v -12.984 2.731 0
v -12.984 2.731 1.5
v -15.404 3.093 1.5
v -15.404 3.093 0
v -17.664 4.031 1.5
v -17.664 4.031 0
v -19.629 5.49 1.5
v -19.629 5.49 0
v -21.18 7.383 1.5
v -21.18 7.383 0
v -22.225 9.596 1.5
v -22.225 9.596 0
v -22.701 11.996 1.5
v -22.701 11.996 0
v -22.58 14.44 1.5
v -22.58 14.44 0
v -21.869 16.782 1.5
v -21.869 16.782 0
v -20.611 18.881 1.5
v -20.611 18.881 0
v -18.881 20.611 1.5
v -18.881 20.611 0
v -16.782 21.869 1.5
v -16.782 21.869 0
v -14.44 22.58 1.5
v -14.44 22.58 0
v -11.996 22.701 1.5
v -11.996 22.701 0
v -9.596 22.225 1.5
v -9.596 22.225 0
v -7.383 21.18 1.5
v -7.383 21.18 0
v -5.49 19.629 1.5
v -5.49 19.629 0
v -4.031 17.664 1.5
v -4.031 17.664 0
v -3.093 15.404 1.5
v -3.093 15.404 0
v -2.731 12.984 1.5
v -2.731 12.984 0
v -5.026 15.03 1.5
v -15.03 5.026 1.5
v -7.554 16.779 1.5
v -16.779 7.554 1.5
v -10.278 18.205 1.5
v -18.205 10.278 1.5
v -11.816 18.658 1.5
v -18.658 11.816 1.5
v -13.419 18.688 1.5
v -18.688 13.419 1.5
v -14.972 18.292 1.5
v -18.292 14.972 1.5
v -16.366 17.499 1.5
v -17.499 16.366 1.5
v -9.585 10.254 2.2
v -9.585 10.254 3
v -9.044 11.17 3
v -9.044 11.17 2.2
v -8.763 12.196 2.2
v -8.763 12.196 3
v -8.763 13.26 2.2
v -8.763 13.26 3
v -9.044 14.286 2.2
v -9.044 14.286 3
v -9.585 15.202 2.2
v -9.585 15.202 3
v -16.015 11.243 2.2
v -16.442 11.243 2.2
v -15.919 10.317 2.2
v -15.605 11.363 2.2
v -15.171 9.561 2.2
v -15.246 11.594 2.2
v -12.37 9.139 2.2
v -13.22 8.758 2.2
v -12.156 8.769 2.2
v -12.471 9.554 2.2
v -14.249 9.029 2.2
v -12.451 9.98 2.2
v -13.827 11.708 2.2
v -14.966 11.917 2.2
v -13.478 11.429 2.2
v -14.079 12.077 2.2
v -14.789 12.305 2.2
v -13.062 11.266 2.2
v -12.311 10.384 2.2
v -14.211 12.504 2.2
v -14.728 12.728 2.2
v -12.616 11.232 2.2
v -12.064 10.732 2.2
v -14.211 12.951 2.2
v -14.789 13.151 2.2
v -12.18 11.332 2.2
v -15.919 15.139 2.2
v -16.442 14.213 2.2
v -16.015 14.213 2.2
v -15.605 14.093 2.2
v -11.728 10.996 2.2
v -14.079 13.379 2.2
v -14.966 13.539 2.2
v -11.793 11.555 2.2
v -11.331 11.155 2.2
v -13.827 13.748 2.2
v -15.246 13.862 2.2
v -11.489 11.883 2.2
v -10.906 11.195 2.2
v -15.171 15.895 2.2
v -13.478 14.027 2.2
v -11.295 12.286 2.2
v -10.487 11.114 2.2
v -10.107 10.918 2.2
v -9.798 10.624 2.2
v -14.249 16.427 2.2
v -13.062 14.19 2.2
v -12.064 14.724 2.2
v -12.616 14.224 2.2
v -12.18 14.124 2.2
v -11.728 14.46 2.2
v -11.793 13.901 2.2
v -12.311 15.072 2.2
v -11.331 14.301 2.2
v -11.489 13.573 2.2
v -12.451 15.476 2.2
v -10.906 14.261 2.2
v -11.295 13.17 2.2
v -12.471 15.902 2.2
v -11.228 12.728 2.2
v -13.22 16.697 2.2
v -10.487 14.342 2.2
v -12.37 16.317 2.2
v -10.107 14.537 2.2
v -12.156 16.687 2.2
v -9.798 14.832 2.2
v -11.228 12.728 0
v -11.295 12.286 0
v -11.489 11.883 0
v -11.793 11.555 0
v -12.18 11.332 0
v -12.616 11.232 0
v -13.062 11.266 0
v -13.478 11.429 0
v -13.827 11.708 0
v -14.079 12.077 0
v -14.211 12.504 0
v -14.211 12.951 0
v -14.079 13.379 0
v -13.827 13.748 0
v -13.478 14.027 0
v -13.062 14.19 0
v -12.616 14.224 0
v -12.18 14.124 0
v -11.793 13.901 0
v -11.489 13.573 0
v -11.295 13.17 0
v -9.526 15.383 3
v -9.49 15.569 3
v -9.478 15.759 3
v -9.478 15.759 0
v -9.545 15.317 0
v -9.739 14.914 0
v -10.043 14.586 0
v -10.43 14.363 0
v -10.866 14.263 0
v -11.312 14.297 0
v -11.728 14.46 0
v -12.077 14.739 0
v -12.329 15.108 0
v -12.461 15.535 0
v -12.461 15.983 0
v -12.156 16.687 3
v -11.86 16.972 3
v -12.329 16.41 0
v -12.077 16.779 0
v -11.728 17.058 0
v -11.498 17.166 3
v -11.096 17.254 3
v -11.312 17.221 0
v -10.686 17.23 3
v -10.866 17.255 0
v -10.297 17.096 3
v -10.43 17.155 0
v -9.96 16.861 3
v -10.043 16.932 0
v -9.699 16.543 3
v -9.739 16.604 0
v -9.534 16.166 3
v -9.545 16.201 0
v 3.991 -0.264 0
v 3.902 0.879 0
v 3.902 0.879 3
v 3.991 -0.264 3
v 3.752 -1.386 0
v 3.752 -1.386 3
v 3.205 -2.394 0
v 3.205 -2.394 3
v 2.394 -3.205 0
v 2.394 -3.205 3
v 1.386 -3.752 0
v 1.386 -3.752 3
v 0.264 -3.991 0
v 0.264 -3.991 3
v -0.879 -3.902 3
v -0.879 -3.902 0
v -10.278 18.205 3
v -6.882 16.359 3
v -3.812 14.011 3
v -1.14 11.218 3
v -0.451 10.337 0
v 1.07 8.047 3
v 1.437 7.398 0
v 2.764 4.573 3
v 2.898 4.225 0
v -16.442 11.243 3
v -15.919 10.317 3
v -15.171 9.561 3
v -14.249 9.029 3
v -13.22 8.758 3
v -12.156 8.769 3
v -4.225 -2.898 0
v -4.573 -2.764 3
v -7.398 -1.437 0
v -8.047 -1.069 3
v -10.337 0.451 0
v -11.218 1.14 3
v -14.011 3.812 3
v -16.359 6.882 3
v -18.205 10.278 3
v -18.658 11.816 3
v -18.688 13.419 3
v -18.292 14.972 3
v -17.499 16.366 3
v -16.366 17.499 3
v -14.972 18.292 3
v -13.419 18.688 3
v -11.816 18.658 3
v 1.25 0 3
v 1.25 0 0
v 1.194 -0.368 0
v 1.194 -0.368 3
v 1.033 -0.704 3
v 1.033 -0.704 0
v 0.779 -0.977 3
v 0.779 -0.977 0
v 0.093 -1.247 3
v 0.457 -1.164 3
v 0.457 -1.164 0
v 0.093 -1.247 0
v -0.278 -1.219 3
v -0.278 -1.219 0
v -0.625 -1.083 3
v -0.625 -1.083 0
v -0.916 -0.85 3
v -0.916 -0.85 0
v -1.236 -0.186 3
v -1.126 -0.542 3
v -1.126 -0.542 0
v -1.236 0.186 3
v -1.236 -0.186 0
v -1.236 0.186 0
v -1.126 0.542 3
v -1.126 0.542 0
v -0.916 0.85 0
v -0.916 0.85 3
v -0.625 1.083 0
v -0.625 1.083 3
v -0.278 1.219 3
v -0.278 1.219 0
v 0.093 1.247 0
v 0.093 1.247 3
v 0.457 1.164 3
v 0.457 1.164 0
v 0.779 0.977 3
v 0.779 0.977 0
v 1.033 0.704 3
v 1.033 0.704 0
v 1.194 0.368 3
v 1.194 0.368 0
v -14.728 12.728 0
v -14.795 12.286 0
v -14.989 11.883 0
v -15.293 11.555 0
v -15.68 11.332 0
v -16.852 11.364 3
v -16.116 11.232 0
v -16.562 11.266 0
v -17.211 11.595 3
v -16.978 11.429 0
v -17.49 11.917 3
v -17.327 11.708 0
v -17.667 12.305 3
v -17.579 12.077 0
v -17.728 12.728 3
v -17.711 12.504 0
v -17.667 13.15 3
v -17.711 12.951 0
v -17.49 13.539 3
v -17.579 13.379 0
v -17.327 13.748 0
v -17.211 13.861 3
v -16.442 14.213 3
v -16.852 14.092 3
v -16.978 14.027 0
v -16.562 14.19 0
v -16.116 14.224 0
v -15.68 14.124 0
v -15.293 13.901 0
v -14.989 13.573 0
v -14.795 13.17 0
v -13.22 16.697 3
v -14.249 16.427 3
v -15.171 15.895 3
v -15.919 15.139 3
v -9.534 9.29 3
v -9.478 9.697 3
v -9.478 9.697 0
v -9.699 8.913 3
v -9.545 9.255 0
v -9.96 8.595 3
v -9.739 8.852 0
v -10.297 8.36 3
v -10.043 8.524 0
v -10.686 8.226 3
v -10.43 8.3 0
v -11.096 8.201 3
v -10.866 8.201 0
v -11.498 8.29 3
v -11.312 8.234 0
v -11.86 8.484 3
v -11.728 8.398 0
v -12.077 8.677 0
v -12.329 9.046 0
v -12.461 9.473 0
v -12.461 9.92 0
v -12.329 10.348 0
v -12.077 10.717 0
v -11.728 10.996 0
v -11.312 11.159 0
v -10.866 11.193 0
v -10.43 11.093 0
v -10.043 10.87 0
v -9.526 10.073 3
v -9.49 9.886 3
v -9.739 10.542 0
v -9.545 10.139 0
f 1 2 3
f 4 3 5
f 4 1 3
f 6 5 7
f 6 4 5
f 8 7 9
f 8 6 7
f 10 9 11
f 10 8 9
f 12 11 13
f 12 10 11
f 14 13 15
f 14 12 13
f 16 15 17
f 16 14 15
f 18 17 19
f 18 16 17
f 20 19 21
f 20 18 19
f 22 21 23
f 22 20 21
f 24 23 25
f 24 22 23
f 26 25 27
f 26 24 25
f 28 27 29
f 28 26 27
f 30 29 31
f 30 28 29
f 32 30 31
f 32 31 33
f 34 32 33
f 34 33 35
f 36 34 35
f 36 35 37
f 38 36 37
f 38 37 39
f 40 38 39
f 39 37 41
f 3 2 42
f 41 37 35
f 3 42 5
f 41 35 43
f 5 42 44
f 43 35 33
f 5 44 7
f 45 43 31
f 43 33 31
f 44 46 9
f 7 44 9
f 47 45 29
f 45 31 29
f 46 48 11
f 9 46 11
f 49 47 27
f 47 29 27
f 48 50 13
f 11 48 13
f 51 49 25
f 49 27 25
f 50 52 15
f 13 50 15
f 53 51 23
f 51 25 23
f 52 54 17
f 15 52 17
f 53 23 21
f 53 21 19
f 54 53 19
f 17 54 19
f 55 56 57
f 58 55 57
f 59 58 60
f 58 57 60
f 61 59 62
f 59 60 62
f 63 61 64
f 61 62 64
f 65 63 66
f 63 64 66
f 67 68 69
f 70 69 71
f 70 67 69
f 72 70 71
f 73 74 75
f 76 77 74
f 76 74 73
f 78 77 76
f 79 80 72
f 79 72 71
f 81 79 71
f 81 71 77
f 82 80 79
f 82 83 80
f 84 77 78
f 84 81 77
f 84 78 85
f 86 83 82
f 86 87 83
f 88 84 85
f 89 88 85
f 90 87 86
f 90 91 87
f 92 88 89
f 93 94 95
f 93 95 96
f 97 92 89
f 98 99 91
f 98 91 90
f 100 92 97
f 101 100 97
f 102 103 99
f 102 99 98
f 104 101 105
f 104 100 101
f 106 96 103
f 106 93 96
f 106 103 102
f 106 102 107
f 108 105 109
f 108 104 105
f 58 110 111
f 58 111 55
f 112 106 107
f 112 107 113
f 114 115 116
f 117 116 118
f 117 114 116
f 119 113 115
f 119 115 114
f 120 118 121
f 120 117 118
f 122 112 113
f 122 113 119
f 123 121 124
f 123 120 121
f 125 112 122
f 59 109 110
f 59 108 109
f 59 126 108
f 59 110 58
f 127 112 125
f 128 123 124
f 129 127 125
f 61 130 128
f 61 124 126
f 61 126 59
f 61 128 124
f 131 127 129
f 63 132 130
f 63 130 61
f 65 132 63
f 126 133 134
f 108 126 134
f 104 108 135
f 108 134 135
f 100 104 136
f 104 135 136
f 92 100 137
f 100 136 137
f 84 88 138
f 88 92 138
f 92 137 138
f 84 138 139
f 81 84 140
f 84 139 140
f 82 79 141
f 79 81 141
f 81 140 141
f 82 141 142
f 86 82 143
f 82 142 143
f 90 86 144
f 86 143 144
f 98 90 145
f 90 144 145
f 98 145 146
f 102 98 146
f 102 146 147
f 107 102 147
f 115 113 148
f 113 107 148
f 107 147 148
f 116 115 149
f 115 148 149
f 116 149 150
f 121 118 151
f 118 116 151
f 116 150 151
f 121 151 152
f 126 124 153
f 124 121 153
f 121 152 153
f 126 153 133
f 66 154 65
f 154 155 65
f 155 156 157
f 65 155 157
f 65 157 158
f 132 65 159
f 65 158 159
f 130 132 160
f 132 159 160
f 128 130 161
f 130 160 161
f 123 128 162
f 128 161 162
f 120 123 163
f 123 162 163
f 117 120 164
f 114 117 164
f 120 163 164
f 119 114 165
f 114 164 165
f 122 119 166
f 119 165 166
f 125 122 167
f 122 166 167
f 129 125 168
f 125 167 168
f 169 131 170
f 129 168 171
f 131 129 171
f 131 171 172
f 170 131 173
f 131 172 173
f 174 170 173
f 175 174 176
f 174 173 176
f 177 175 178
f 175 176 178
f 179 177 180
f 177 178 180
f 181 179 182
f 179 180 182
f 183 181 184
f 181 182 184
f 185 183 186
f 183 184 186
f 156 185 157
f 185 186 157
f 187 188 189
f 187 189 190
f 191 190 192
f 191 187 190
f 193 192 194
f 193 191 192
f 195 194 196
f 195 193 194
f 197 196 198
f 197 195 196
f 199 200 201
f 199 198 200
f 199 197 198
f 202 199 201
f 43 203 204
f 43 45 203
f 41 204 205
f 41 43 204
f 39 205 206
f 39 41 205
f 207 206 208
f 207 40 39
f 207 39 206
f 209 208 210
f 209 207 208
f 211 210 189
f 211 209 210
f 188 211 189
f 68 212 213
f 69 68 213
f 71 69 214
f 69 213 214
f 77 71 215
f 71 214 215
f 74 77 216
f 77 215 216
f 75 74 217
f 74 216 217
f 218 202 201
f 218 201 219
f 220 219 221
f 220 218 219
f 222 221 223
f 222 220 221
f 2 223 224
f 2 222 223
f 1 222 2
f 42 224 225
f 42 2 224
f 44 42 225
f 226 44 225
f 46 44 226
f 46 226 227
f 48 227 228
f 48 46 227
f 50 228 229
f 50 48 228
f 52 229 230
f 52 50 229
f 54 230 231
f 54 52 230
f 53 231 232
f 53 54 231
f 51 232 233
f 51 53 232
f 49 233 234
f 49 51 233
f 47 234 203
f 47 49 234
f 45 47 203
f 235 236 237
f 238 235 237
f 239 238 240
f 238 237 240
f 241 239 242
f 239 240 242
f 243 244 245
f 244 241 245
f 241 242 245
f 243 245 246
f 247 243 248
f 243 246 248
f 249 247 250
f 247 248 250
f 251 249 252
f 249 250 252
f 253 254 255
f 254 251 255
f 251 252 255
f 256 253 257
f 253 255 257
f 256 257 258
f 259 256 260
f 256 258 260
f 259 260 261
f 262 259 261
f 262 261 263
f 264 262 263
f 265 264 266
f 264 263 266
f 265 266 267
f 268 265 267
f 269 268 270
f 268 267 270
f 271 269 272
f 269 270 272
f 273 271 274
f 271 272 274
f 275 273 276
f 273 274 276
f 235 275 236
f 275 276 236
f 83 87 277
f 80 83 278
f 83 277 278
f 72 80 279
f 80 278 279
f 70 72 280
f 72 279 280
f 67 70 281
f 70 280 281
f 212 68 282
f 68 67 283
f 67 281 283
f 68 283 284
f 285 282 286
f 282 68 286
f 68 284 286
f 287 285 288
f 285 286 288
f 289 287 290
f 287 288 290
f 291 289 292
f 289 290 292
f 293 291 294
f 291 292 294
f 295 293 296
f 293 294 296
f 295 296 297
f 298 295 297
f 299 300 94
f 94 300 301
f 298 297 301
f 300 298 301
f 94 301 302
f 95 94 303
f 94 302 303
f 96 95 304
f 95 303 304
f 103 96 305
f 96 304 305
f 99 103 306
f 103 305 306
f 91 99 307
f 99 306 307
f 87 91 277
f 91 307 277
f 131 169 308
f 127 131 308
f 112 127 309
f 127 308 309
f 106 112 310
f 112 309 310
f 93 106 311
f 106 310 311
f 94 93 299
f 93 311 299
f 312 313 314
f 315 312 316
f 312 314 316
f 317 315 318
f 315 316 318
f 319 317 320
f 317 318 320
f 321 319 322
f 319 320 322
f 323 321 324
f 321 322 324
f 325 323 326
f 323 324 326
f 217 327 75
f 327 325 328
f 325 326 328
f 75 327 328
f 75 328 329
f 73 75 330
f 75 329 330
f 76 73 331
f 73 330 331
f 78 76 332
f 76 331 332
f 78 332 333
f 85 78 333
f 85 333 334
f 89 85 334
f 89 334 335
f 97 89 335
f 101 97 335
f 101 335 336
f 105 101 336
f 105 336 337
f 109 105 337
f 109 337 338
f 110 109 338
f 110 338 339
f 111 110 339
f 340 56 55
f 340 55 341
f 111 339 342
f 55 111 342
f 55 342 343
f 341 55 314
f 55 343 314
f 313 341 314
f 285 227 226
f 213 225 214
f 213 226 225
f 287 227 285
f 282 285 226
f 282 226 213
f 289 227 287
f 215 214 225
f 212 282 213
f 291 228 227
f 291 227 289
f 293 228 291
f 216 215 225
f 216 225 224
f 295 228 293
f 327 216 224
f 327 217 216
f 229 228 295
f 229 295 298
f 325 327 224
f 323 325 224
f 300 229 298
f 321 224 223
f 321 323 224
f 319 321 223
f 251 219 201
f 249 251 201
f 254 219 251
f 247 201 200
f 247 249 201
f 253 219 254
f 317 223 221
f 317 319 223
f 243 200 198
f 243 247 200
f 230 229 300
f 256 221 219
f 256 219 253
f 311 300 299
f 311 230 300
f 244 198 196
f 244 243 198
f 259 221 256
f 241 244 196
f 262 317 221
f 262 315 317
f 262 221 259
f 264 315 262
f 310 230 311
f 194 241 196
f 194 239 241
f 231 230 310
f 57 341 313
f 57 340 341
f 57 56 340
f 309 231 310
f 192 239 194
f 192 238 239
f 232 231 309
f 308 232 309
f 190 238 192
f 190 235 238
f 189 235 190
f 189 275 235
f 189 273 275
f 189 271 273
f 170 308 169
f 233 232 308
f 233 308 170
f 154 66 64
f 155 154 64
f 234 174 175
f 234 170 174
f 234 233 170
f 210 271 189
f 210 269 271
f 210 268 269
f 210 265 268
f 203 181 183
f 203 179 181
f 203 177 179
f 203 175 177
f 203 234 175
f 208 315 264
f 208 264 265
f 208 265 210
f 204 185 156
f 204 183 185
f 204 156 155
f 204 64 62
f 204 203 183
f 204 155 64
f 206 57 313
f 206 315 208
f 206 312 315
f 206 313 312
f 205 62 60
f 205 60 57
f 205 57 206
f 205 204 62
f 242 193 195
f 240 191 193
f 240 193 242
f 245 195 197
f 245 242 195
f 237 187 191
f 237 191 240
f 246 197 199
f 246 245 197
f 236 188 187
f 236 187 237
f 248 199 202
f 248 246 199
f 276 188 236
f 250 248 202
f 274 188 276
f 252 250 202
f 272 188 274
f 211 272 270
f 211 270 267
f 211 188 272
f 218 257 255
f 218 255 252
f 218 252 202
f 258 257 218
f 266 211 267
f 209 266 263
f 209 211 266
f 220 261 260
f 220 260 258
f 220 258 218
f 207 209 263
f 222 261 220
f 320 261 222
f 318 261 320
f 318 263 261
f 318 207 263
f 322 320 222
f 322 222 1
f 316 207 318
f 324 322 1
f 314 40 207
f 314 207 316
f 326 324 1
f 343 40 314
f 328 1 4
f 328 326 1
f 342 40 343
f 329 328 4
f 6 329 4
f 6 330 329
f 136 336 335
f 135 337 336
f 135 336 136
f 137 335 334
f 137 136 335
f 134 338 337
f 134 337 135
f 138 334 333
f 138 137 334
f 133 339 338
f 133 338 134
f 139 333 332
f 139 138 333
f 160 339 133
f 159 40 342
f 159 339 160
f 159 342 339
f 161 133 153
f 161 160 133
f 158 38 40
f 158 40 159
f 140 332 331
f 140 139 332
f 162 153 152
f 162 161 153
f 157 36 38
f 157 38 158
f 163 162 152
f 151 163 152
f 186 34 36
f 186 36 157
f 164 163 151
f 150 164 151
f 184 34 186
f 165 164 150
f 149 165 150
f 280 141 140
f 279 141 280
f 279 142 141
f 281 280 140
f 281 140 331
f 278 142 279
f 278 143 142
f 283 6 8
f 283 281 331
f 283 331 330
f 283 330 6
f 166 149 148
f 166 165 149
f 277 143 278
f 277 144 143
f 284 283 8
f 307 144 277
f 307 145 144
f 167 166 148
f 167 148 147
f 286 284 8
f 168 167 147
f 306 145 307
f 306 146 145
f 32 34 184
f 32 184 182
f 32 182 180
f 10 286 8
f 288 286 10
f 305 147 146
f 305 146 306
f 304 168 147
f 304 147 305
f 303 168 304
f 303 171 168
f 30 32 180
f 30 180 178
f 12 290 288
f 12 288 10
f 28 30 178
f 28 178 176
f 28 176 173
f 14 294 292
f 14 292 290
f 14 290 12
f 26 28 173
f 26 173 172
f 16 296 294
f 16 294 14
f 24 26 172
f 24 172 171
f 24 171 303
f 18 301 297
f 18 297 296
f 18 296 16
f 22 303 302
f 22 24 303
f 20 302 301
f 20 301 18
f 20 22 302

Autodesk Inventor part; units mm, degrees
ref_plane "YZ Plane" through (0, 0, 0) normal (1, 0, 0) x (0, 1, 0)
ref_plane "XZ Plane" through (0, 0, 0) normal (0, 1, 0) x (-1, 0, 0)
ref_plane "XY Plane" through (0, 0, 0) normal (0, 0, 1) x (1, 0, 0)
sketch "スケッチ1" plane through (0, 0, 0) normal (0, 0, 1) x (1, 0, 0)
  circle A0 centre (-10.9779, 15.759) radius 1.5
  circle A1 centre (-12.7279, 12.7279) radius 1.25
  circle A2 centre (-16.2279, 12.7279) radius 1.5
  circle A3 centre (-10.9779, 9.6968) radius 1.5
  circle A4 centre (-12.7279, 12.7279) radius 6
  circle A5 centre (0, 0) radius 4
  circle A6 centre (0, 0) radius 1.25
  arc A7 (3.9022, 0.8792) -> (-10.2779, 18.2049) centre (-20.4864, -4.6158) ccw
  arc A8 (-18.2049, 10.2779) -> (-0.8792, -3.9022) centre (4.6158, 20.4864) ccw
  circle A9 centre (-12.7279, 12.7279) radius 1.5
  circle A10 centre (-16.2279, 12.7279) radius 1.5
  circle A11 centre (-12.7279, 12.7279) radius 1.25
  circle A12 centre (-10.9779, 9.6968) radius 1.5
  circle A13 centre (-10.9779, 15.759) radius 1.5
  circle A14 centre (-12.7279, 12.7279) radius 6
  circle A15 centre (0, 0) radius 4
  circle A16 centre (0, 0) radius 1.25
  arc A17 (3.9022, 0.8792) -> (-10.2779, 18.2049) centre (-20.4864, -4.6158) ccw
  arc A18 (-18.2049, 10.2779) -> (-0.8792, -3.9022) centre (4.6158, 20.4864) ccw
  circle A19 centre (-12.7279, 12.7279) radius 1.5
  dimension "d0" = 8
  dimension "d1" = 2.5
  dimension "d2" = 25
  dimension "d3" = 3
  dimension "d6" = 8
  dimension "d7" = 2.5
  dimension "d8" = 25
  dimension "d9" = 3
  dimension "d19" = 3
  dimension "d20" = 2.5
extrude "押し出し1" add sketch "スケッチ1" along normal blind 3 contours A4 | A4 A7 A5 A8 | A5
sketch "スケッチ2" plane through (0, 0, 3) normal (0, 0, 1) x (1, 0, 0)
  circle A0 centre (-12.7279, 12.7279) radius 1.5 projected
  circle A1 centre (-12.7279, 12.7279) radius 4
  point P0 (0, 0)
  dimension "d10" = 8
extrude "押し出し2" cut sketch "スケッチ2" against normal blind 0.8
sketch "スケッチ3" plane through (0, 0, 0) normal (0, 0, -1) x (-1, 0, 0)
  circle A0 centre (12.7279, 12.7279) radius 1.5 projected
  circle A1 centre (12.7279, 12.7279) radius 10
  arc A2 (0.8792, -3.9022) -> (18.2049, 10.2779) centre (-4.6158, 20.4864) ccw projected
  arc A3 (18.2049, 10.2779) -> (10.2779, 18.2049) centre (12.7279, 12.7279) ccw projected
  arc A4 (10.2779, 18.2049) -> (-3.9022, 0.8792) centre (20.4864, -4.6158) ccw projected
  arc A5 (-3.9022, 0.8792) -> (0.8792, -3.9022) centre (0, 0) ccw projected
  circle A6 centre (0, 0) radius 1.25 projected
  circle A7 centre (16.2279, 12.7279) radius 1.5 projected
  circle A8 centre (12.7279, 12.7279) radius 1.5 projected
  circle A9 centre (10.9779, 9.6968) radius 1.5 projected
  circle A10 centre (10.9779, 15.759) radius 1.5 projected
  point P0 (12.9839, 2.7312)
  point P1 (2.7312, 12.9839)
  dimension "d13" = 20
extrude "押し出し3" add sketch "スケッチ3" against normal blind 1.5 contours A1 A2 A3 A4 picked at (8.342, 18.6804)
equation "\"d1\" = d20"
equation "\"d3\" = d9"
equation "\"d7\" = d1"
equation "\"d9\" = d19"
properties part number "原動節4" material "アルミニウム 2014-T4"
